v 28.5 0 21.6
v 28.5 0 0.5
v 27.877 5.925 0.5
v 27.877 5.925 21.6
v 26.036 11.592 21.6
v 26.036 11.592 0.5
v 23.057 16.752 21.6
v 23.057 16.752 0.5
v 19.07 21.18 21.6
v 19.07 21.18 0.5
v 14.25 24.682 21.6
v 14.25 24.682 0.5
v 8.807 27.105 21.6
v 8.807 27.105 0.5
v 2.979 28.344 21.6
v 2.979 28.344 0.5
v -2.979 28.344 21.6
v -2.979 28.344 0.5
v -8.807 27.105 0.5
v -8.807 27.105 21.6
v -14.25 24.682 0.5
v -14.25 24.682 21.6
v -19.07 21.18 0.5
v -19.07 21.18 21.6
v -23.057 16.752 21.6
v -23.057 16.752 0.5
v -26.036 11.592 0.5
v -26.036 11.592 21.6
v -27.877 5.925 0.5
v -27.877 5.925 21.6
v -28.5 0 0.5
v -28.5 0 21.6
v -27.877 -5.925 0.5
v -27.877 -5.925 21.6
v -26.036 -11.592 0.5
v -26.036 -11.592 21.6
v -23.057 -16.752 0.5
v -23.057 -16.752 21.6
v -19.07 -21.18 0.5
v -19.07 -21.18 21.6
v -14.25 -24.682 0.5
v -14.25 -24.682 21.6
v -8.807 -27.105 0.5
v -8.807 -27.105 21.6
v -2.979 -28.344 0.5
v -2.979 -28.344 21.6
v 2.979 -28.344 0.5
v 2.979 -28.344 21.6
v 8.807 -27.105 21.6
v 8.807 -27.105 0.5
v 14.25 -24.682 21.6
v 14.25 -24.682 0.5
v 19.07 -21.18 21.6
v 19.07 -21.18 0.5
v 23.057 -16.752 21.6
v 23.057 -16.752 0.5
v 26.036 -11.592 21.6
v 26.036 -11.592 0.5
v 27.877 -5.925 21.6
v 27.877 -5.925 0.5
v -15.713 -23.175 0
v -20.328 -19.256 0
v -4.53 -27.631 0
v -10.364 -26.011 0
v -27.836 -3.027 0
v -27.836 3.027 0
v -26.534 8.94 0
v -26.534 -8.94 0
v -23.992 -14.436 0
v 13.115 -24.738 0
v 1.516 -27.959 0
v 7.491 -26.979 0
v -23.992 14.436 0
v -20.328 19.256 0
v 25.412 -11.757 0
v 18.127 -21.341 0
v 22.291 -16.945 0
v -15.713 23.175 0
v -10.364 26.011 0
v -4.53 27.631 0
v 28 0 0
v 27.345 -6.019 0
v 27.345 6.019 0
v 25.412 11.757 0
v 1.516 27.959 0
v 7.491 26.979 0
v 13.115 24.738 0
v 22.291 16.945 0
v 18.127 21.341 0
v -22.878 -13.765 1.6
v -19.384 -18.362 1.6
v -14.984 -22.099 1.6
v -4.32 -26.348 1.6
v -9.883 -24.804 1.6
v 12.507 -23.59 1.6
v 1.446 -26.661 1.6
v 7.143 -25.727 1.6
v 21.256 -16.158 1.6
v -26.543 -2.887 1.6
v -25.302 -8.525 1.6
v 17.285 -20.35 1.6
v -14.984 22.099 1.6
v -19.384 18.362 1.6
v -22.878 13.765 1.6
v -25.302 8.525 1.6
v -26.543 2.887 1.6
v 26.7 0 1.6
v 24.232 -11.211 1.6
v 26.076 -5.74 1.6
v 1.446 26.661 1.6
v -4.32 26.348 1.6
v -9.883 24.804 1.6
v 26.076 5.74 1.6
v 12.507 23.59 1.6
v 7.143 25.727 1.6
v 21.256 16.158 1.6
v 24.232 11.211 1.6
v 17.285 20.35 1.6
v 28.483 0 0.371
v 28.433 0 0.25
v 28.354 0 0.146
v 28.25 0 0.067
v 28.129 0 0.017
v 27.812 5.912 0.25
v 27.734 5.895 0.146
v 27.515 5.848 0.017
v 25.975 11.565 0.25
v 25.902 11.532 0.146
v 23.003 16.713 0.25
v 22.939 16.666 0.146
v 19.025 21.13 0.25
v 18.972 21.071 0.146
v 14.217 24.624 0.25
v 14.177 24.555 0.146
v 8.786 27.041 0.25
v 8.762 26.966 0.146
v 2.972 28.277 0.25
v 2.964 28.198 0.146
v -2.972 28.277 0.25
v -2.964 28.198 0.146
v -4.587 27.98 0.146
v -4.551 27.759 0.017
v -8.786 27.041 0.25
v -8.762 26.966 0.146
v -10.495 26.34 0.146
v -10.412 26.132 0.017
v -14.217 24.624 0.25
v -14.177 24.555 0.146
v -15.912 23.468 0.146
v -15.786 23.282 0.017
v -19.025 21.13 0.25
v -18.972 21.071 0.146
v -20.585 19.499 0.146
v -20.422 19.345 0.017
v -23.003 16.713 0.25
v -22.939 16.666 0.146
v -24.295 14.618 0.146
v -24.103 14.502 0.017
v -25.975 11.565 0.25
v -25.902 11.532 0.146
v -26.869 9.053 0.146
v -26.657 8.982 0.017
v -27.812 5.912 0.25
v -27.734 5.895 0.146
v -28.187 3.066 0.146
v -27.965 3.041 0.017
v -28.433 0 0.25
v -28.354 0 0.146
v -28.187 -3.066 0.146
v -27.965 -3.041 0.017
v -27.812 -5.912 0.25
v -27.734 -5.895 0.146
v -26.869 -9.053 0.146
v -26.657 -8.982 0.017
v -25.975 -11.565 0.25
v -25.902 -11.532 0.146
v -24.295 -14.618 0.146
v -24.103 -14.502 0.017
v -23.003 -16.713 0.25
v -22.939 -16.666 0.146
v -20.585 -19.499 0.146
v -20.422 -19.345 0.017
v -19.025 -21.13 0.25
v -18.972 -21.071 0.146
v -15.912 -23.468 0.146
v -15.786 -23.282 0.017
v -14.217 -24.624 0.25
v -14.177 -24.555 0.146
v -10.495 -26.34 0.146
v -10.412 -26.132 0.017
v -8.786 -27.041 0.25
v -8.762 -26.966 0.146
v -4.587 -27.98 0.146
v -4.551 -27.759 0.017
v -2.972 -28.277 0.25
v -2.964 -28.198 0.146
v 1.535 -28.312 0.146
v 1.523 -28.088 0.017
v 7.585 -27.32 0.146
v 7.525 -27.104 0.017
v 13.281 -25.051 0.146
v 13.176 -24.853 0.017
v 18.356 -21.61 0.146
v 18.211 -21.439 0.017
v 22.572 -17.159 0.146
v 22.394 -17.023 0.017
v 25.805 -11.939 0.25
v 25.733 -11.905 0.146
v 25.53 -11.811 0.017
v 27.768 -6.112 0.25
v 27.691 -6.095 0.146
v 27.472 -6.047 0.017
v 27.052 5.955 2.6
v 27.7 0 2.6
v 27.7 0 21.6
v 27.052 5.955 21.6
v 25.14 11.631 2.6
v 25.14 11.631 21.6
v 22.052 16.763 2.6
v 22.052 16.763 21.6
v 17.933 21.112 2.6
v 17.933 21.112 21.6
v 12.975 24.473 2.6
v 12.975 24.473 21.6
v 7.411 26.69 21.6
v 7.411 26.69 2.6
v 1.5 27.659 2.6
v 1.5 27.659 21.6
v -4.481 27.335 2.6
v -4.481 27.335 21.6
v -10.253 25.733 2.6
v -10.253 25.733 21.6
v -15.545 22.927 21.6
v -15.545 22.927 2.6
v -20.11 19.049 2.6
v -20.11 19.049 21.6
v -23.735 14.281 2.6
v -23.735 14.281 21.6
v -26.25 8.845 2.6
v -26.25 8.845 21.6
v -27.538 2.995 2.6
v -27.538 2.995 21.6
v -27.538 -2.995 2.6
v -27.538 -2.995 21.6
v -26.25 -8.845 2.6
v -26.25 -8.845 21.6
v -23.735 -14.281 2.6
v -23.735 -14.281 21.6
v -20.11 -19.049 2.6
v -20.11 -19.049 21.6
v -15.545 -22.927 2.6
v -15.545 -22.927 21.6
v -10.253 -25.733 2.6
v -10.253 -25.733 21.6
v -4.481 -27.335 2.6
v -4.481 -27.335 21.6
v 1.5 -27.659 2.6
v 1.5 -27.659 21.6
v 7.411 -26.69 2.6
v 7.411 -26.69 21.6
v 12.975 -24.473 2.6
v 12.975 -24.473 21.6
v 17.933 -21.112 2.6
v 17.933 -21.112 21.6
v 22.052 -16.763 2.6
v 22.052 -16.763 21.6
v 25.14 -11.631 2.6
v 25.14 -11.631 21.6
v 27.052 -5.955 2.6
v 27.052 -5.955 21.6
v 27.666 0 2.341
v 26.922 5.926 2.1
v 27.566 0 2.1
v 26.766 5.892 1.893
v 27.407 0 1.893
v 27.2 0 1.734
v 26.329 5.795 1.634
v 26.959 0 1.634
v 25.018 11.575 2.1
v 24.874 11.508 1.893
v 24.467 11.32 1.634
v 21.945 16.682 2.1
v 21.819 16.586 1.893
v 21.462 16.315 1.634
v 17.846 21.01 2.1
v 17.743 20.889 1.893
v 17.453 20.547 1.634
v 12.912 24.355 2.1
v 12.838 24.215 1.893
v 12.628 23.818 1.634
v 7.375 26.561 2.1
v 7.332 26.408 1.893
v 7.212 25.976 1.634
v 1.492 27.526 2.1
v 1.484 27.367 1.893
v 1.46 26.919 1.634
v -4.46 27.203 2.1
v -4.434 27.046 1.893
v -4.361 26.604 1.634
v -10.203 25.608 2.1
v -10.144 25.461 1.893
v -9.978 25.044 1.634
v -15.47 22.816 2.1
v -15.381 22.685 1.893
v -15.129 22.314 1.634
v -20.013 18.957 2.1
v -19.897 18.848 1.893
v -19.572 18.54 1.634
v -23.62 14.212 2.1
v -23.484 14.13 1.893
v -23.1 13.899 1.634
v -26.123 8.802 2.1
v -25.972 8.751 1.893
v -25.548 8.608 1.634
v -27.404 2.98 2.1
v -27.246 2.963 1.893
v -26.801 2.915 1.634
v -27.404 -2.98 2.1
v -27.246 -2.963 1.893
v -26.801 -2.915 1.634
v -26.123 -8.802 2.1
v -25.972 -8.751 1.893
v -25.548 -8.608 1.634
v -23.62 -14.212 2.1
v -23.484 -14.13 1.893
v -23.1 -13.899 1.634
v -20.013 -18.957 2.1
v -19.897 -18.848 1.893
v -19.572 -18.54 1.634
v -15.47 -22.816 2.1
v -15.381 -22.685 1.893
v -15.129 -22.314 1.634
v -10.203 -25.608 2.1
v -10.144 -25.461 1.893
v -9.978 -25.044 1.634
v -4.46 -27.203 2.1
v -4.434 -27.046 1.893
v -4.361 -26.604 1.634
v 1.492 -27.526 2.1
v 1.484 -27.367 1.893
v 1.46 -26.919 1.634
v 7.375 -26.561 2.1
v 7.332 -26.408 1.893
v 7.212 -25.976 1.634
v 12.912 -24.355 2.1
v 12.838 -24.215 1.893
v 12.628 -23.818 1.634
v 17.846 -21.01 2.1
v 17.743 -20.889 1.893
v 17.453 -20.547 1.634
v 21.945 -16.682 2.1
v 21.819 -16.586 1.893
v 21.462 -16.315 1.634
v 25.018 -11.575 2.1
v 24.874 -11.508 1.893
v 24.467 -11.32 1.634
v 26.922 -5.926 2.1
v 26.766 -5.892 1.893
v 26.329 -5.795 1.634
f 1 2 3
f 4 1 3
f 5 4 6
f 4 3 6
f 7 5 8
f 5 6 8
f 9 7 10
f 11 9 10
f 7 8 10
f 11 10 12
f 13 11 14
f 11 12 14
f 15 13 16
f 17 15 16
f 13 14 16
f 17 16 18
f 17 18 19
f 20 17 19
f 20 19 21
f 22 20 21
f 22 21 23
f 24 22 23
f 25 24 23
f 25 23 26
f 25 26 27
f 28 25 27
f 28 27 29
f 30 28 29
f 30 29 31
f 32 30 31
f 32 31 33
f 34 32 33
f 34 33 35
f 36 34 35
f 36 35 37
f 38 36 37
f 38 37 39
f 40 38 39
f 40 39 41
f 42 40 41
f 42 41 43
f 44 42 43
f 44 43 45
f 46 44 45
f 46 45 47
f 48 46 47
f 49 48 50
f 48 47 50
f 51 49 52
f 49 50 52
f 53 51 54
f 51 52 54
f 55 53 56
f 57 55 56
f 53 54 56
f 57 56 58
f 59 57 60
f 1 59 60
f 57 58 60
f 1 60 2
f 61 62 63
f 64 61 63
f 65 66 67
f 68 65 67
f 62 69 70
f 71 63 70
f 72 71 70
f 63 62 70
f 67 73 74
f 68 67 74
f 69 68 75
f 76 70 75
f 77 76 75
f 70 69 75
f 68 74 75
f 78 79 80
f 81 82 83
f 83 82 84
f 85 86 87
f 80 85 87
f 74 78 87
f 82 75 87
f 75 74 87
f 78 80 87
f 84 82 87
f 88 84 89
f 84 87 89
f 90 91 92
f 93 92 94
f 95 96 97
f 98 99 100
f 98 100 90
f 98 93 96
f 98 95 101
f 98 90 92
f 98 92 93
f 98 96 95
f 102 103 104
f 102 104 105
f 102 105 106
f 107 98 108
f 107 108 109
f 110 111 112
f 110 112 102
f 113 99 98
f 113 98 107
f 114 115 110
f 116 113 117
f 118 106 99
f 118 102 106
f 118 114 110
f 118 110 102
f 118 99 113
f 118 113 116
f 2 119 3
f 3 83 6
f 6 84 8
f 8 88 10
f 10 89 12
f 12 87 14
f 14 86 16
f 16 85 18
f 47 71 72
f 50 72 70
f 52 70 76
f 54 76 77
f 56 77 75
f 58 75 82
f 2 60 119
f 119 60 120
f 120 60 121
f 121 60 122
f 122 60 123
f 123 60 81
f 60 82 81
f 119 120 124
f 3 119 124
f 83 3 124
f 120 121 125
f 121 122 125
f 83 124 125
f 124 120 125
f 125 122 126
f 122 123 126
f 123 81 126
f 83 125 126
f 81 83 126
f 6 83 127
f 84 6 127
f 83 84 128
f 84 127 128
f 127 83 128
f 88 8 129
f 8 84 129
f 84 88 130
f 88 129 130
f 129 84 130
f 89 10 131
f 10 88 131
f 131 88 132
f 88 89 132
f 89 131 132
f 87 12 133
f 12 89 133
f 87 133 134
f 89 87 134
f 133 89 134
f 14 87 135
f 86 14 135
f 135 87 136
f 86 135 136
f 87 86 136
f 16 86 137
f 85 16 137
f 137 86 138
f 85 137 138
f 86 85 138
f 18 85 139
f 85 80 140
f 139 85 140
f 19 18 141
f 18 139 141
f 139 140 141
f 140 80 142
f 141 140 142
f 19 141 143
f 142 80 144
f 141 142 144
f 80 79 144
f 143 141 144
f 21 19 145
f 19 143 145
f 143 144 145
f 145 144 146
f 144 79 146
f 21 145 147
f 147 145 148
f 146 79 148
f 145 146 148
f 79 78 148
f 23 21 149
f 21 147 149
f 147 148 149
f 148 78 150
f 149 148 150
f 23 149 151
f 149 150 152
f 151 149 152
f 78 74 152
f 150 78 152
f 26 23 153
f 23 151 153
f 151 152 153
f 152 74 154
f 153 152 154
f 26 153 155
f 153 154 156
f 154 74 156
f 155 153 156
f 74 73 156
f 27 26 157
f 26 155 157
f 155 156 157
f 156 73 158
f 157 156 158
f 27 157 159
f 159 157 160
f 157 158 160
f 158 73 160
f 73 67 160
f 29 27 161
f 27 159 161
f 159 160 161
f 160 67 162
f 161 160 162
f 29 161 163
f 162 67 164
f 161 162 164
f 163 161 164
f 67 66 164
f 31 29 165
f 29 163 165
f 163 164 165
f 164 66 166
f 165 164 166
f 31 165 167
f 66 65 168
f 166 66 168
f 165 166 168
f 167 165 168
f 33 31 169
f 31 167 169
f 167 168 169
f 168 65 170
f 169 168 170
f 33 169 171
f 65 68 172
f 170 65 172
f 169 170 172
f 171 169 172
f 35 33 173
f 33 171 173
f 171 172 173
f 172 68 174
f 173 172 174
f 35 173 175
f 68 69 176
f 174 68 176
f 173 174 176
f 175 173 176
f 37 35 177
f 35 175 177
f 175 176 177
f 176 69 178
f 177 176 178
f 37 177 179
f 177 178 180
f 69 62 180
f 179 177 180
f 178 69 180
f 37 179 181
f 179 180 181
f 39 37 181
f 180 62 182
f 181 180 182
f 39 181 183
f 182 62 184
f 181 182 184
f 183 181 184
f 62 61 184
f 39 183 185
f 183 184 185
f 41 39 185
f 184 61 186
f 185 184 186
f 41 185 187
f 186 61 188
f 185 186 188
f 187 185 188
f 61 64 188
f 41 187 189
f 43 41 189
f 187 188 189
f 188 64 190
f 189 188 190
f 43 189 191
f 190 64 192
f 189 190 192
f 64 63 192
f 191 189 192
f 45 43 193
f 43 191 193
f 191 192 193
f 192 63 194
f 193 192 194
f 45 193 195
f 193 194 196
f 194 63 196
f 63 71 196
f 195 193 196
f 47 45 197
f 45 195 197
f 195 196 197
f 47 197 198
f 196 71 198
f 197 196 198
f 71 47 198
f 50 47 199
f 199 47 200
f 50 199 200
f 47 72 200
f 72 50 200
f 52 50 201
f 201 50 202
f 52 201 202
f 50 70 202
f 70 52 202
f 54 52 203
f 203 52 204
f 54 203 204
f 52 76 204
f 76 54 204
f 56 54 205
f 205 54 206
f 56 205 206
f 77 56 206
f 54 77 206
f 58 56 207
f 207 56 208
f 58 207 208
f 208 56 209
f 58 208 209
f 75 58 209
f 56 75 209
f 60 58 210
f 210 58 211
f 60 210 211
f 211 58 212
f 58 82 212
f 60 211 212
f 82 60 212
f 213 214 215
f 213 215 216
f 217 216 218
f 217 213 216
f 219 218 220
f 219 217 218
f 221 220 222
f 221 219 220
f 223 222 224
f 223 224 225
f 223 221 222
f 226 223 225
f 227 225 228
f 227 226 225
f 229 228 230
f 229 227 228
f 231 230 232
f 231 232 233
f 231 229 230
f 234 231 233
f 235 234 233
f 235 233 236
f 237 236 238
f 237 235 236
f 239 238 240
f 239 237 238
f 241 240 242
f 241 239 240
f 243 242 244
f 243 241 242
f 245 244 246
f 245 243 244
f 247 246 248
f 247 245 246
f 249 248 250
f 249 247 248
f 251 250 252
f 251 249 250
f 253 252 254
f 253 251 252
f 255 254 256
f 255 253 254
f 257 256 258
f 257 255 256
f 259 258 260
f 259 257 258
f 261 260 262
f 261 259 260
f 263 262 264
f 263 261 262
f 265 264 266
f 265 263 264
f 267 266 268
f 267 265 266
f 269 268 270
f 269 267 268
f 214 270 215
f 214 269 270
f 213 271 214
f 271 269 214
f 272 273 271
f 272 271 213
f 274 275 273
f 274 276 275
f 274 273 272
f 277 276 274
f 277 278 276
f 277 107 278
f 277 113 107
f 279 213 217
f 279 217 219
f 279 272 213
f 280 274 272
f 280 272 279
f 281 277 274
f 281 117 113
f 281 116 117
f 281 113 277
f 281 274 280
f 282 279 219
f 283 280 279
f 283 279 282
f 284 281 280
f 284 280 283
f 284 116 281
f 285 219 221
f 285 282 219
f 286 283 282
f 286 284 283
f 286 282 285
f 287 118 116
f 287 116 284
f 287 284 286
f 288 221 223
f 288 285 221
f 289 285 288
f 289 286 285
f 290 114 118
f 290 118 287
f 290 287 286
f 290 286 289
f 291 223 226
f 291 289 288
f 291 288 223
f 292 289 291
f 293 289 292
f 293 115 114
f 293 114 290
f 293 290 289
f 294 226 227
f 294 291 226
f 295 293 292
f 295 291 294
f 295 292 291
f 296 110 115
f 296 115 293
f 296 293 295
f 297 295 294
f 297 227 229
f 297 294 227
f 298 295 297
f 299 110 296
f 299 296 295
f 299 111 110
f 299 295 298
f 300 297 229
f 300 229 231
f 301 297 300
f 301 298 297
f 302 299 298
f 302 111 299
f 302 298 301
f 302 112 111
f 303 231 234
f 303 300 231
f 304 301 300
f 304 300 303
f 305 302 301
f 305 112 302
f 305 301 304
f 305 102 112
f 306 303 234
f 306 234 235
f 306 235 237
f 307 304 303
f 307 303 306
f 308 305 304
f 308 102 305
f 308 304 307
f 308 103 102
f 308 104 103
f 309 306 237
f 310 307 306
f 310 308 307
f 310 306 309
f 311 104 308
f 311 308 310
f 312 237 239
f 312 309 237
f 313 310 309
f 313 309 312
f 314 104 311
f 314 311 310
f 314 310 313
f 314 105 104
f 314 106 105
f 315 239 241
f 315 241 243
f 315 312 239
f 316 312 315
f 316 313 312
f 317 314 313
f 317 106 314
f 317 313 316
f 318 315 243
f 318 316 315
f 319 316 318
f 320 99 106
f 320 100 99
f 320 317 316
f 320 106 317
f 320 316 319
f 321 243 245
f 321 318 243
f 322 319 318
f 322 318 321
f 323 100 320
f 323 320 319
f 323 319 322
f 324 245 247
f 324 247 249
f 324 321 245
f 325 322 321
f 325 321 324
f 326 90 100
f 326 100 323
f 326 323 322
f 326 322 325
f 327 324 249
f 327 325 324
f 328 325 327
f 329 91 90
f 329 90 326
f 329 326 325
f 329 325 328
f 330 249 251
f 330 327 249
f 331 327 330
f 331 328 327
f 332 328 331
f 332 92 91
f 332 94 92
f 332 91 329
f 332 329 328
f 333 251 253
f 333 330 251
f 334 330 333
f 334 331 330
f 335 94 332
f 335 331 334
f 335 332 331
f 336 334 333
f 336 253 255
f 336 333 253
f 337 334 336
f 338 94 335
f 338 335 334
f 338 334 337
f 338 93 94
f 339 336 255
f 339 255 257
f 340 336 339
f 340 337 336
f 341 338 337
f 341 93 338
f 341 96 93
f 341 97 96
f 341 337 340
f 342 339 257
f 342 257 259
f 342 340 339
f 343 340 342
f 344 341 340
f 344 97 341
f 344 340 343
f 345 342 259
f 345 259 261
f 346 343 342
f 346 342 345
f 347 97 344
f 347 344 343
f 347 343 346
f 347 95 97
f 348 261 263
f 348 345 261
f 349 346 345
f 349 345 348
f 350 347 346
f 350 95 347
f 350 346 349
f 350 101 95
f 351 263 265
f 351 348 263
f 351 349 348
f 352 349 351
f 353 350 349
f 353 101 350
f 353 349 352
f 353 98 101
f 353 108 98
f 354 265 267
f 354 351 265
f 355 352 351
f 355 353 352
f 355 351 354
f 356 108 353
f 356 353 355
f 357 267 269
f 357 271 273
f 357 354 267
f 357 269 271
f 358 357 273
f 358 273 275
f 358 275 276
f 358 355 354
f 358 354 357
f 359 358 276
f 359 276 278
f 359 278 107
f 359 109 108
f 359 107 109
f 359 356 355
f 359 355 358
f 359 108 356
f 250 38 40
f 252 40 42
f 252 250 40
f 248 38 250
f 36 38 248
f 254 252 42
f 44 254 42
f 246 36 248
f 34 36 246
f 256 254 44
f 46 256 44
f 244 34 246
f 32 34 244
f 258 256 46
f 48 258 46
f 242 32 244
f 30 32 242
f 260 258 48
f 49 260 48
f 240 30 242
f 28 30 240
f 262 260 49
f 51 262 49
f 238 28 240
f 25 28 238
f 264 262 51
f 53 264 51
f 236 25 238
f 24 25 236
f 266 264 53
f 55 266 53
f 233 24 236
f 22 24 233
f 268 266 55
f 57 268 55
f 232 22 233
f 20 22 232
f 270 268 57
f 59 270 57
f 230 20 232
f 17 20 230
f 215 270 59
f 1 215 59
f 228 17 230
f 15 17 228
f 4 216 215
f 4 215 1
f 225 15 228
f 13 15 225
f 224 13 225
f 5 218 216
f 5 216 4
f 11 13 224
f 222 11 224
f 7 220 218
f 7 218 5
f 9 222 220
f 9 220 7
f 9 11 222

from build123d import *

# Parameters (mm, degrees)
SKETCH_R      = 28.5
PAD_DEPTH     = 1.6
SKETCH001_R   = 28.5
SKETCH001_R_2 = 27.7
PAD001_DEPTH  = 20
FILLET_R      = 0.5
FILLET001_R   = 1


with BuildPart() as part:
    # Sketch → Pad (new body)
    with BuildSketch(Plane.XY):
        Circle(SKETCH_R)
    extrude(amount=PAD_DEPTH)

    # Sketch001 (on Face3 of Pad) → Pad001 (join)
    with BuildSketch(Plane.XY.offset(1.6)):
        Circle(SKETCH001_R)
        Circle(SKETCH001_R_2, mode=Mode.SUBTRACT)
    extrude(amount=PAD001_DEPTH)

    # Fillet
    fillet_edges = [part.edges().sort_by_distance(p)[0] for p in [
        (-28.5, 0, 0),
    ]]
    fillet(fillet_edges, radius=FILLET_R)

    # Fillet001
    fillet001_edges = [part.edges().sort_by_distance(p)[0] for p in [
        (-27.7, 0, 1.6),
    ]]
    fillet(fillet001_edges, radius=FILLET001_R)


solid = part.part
